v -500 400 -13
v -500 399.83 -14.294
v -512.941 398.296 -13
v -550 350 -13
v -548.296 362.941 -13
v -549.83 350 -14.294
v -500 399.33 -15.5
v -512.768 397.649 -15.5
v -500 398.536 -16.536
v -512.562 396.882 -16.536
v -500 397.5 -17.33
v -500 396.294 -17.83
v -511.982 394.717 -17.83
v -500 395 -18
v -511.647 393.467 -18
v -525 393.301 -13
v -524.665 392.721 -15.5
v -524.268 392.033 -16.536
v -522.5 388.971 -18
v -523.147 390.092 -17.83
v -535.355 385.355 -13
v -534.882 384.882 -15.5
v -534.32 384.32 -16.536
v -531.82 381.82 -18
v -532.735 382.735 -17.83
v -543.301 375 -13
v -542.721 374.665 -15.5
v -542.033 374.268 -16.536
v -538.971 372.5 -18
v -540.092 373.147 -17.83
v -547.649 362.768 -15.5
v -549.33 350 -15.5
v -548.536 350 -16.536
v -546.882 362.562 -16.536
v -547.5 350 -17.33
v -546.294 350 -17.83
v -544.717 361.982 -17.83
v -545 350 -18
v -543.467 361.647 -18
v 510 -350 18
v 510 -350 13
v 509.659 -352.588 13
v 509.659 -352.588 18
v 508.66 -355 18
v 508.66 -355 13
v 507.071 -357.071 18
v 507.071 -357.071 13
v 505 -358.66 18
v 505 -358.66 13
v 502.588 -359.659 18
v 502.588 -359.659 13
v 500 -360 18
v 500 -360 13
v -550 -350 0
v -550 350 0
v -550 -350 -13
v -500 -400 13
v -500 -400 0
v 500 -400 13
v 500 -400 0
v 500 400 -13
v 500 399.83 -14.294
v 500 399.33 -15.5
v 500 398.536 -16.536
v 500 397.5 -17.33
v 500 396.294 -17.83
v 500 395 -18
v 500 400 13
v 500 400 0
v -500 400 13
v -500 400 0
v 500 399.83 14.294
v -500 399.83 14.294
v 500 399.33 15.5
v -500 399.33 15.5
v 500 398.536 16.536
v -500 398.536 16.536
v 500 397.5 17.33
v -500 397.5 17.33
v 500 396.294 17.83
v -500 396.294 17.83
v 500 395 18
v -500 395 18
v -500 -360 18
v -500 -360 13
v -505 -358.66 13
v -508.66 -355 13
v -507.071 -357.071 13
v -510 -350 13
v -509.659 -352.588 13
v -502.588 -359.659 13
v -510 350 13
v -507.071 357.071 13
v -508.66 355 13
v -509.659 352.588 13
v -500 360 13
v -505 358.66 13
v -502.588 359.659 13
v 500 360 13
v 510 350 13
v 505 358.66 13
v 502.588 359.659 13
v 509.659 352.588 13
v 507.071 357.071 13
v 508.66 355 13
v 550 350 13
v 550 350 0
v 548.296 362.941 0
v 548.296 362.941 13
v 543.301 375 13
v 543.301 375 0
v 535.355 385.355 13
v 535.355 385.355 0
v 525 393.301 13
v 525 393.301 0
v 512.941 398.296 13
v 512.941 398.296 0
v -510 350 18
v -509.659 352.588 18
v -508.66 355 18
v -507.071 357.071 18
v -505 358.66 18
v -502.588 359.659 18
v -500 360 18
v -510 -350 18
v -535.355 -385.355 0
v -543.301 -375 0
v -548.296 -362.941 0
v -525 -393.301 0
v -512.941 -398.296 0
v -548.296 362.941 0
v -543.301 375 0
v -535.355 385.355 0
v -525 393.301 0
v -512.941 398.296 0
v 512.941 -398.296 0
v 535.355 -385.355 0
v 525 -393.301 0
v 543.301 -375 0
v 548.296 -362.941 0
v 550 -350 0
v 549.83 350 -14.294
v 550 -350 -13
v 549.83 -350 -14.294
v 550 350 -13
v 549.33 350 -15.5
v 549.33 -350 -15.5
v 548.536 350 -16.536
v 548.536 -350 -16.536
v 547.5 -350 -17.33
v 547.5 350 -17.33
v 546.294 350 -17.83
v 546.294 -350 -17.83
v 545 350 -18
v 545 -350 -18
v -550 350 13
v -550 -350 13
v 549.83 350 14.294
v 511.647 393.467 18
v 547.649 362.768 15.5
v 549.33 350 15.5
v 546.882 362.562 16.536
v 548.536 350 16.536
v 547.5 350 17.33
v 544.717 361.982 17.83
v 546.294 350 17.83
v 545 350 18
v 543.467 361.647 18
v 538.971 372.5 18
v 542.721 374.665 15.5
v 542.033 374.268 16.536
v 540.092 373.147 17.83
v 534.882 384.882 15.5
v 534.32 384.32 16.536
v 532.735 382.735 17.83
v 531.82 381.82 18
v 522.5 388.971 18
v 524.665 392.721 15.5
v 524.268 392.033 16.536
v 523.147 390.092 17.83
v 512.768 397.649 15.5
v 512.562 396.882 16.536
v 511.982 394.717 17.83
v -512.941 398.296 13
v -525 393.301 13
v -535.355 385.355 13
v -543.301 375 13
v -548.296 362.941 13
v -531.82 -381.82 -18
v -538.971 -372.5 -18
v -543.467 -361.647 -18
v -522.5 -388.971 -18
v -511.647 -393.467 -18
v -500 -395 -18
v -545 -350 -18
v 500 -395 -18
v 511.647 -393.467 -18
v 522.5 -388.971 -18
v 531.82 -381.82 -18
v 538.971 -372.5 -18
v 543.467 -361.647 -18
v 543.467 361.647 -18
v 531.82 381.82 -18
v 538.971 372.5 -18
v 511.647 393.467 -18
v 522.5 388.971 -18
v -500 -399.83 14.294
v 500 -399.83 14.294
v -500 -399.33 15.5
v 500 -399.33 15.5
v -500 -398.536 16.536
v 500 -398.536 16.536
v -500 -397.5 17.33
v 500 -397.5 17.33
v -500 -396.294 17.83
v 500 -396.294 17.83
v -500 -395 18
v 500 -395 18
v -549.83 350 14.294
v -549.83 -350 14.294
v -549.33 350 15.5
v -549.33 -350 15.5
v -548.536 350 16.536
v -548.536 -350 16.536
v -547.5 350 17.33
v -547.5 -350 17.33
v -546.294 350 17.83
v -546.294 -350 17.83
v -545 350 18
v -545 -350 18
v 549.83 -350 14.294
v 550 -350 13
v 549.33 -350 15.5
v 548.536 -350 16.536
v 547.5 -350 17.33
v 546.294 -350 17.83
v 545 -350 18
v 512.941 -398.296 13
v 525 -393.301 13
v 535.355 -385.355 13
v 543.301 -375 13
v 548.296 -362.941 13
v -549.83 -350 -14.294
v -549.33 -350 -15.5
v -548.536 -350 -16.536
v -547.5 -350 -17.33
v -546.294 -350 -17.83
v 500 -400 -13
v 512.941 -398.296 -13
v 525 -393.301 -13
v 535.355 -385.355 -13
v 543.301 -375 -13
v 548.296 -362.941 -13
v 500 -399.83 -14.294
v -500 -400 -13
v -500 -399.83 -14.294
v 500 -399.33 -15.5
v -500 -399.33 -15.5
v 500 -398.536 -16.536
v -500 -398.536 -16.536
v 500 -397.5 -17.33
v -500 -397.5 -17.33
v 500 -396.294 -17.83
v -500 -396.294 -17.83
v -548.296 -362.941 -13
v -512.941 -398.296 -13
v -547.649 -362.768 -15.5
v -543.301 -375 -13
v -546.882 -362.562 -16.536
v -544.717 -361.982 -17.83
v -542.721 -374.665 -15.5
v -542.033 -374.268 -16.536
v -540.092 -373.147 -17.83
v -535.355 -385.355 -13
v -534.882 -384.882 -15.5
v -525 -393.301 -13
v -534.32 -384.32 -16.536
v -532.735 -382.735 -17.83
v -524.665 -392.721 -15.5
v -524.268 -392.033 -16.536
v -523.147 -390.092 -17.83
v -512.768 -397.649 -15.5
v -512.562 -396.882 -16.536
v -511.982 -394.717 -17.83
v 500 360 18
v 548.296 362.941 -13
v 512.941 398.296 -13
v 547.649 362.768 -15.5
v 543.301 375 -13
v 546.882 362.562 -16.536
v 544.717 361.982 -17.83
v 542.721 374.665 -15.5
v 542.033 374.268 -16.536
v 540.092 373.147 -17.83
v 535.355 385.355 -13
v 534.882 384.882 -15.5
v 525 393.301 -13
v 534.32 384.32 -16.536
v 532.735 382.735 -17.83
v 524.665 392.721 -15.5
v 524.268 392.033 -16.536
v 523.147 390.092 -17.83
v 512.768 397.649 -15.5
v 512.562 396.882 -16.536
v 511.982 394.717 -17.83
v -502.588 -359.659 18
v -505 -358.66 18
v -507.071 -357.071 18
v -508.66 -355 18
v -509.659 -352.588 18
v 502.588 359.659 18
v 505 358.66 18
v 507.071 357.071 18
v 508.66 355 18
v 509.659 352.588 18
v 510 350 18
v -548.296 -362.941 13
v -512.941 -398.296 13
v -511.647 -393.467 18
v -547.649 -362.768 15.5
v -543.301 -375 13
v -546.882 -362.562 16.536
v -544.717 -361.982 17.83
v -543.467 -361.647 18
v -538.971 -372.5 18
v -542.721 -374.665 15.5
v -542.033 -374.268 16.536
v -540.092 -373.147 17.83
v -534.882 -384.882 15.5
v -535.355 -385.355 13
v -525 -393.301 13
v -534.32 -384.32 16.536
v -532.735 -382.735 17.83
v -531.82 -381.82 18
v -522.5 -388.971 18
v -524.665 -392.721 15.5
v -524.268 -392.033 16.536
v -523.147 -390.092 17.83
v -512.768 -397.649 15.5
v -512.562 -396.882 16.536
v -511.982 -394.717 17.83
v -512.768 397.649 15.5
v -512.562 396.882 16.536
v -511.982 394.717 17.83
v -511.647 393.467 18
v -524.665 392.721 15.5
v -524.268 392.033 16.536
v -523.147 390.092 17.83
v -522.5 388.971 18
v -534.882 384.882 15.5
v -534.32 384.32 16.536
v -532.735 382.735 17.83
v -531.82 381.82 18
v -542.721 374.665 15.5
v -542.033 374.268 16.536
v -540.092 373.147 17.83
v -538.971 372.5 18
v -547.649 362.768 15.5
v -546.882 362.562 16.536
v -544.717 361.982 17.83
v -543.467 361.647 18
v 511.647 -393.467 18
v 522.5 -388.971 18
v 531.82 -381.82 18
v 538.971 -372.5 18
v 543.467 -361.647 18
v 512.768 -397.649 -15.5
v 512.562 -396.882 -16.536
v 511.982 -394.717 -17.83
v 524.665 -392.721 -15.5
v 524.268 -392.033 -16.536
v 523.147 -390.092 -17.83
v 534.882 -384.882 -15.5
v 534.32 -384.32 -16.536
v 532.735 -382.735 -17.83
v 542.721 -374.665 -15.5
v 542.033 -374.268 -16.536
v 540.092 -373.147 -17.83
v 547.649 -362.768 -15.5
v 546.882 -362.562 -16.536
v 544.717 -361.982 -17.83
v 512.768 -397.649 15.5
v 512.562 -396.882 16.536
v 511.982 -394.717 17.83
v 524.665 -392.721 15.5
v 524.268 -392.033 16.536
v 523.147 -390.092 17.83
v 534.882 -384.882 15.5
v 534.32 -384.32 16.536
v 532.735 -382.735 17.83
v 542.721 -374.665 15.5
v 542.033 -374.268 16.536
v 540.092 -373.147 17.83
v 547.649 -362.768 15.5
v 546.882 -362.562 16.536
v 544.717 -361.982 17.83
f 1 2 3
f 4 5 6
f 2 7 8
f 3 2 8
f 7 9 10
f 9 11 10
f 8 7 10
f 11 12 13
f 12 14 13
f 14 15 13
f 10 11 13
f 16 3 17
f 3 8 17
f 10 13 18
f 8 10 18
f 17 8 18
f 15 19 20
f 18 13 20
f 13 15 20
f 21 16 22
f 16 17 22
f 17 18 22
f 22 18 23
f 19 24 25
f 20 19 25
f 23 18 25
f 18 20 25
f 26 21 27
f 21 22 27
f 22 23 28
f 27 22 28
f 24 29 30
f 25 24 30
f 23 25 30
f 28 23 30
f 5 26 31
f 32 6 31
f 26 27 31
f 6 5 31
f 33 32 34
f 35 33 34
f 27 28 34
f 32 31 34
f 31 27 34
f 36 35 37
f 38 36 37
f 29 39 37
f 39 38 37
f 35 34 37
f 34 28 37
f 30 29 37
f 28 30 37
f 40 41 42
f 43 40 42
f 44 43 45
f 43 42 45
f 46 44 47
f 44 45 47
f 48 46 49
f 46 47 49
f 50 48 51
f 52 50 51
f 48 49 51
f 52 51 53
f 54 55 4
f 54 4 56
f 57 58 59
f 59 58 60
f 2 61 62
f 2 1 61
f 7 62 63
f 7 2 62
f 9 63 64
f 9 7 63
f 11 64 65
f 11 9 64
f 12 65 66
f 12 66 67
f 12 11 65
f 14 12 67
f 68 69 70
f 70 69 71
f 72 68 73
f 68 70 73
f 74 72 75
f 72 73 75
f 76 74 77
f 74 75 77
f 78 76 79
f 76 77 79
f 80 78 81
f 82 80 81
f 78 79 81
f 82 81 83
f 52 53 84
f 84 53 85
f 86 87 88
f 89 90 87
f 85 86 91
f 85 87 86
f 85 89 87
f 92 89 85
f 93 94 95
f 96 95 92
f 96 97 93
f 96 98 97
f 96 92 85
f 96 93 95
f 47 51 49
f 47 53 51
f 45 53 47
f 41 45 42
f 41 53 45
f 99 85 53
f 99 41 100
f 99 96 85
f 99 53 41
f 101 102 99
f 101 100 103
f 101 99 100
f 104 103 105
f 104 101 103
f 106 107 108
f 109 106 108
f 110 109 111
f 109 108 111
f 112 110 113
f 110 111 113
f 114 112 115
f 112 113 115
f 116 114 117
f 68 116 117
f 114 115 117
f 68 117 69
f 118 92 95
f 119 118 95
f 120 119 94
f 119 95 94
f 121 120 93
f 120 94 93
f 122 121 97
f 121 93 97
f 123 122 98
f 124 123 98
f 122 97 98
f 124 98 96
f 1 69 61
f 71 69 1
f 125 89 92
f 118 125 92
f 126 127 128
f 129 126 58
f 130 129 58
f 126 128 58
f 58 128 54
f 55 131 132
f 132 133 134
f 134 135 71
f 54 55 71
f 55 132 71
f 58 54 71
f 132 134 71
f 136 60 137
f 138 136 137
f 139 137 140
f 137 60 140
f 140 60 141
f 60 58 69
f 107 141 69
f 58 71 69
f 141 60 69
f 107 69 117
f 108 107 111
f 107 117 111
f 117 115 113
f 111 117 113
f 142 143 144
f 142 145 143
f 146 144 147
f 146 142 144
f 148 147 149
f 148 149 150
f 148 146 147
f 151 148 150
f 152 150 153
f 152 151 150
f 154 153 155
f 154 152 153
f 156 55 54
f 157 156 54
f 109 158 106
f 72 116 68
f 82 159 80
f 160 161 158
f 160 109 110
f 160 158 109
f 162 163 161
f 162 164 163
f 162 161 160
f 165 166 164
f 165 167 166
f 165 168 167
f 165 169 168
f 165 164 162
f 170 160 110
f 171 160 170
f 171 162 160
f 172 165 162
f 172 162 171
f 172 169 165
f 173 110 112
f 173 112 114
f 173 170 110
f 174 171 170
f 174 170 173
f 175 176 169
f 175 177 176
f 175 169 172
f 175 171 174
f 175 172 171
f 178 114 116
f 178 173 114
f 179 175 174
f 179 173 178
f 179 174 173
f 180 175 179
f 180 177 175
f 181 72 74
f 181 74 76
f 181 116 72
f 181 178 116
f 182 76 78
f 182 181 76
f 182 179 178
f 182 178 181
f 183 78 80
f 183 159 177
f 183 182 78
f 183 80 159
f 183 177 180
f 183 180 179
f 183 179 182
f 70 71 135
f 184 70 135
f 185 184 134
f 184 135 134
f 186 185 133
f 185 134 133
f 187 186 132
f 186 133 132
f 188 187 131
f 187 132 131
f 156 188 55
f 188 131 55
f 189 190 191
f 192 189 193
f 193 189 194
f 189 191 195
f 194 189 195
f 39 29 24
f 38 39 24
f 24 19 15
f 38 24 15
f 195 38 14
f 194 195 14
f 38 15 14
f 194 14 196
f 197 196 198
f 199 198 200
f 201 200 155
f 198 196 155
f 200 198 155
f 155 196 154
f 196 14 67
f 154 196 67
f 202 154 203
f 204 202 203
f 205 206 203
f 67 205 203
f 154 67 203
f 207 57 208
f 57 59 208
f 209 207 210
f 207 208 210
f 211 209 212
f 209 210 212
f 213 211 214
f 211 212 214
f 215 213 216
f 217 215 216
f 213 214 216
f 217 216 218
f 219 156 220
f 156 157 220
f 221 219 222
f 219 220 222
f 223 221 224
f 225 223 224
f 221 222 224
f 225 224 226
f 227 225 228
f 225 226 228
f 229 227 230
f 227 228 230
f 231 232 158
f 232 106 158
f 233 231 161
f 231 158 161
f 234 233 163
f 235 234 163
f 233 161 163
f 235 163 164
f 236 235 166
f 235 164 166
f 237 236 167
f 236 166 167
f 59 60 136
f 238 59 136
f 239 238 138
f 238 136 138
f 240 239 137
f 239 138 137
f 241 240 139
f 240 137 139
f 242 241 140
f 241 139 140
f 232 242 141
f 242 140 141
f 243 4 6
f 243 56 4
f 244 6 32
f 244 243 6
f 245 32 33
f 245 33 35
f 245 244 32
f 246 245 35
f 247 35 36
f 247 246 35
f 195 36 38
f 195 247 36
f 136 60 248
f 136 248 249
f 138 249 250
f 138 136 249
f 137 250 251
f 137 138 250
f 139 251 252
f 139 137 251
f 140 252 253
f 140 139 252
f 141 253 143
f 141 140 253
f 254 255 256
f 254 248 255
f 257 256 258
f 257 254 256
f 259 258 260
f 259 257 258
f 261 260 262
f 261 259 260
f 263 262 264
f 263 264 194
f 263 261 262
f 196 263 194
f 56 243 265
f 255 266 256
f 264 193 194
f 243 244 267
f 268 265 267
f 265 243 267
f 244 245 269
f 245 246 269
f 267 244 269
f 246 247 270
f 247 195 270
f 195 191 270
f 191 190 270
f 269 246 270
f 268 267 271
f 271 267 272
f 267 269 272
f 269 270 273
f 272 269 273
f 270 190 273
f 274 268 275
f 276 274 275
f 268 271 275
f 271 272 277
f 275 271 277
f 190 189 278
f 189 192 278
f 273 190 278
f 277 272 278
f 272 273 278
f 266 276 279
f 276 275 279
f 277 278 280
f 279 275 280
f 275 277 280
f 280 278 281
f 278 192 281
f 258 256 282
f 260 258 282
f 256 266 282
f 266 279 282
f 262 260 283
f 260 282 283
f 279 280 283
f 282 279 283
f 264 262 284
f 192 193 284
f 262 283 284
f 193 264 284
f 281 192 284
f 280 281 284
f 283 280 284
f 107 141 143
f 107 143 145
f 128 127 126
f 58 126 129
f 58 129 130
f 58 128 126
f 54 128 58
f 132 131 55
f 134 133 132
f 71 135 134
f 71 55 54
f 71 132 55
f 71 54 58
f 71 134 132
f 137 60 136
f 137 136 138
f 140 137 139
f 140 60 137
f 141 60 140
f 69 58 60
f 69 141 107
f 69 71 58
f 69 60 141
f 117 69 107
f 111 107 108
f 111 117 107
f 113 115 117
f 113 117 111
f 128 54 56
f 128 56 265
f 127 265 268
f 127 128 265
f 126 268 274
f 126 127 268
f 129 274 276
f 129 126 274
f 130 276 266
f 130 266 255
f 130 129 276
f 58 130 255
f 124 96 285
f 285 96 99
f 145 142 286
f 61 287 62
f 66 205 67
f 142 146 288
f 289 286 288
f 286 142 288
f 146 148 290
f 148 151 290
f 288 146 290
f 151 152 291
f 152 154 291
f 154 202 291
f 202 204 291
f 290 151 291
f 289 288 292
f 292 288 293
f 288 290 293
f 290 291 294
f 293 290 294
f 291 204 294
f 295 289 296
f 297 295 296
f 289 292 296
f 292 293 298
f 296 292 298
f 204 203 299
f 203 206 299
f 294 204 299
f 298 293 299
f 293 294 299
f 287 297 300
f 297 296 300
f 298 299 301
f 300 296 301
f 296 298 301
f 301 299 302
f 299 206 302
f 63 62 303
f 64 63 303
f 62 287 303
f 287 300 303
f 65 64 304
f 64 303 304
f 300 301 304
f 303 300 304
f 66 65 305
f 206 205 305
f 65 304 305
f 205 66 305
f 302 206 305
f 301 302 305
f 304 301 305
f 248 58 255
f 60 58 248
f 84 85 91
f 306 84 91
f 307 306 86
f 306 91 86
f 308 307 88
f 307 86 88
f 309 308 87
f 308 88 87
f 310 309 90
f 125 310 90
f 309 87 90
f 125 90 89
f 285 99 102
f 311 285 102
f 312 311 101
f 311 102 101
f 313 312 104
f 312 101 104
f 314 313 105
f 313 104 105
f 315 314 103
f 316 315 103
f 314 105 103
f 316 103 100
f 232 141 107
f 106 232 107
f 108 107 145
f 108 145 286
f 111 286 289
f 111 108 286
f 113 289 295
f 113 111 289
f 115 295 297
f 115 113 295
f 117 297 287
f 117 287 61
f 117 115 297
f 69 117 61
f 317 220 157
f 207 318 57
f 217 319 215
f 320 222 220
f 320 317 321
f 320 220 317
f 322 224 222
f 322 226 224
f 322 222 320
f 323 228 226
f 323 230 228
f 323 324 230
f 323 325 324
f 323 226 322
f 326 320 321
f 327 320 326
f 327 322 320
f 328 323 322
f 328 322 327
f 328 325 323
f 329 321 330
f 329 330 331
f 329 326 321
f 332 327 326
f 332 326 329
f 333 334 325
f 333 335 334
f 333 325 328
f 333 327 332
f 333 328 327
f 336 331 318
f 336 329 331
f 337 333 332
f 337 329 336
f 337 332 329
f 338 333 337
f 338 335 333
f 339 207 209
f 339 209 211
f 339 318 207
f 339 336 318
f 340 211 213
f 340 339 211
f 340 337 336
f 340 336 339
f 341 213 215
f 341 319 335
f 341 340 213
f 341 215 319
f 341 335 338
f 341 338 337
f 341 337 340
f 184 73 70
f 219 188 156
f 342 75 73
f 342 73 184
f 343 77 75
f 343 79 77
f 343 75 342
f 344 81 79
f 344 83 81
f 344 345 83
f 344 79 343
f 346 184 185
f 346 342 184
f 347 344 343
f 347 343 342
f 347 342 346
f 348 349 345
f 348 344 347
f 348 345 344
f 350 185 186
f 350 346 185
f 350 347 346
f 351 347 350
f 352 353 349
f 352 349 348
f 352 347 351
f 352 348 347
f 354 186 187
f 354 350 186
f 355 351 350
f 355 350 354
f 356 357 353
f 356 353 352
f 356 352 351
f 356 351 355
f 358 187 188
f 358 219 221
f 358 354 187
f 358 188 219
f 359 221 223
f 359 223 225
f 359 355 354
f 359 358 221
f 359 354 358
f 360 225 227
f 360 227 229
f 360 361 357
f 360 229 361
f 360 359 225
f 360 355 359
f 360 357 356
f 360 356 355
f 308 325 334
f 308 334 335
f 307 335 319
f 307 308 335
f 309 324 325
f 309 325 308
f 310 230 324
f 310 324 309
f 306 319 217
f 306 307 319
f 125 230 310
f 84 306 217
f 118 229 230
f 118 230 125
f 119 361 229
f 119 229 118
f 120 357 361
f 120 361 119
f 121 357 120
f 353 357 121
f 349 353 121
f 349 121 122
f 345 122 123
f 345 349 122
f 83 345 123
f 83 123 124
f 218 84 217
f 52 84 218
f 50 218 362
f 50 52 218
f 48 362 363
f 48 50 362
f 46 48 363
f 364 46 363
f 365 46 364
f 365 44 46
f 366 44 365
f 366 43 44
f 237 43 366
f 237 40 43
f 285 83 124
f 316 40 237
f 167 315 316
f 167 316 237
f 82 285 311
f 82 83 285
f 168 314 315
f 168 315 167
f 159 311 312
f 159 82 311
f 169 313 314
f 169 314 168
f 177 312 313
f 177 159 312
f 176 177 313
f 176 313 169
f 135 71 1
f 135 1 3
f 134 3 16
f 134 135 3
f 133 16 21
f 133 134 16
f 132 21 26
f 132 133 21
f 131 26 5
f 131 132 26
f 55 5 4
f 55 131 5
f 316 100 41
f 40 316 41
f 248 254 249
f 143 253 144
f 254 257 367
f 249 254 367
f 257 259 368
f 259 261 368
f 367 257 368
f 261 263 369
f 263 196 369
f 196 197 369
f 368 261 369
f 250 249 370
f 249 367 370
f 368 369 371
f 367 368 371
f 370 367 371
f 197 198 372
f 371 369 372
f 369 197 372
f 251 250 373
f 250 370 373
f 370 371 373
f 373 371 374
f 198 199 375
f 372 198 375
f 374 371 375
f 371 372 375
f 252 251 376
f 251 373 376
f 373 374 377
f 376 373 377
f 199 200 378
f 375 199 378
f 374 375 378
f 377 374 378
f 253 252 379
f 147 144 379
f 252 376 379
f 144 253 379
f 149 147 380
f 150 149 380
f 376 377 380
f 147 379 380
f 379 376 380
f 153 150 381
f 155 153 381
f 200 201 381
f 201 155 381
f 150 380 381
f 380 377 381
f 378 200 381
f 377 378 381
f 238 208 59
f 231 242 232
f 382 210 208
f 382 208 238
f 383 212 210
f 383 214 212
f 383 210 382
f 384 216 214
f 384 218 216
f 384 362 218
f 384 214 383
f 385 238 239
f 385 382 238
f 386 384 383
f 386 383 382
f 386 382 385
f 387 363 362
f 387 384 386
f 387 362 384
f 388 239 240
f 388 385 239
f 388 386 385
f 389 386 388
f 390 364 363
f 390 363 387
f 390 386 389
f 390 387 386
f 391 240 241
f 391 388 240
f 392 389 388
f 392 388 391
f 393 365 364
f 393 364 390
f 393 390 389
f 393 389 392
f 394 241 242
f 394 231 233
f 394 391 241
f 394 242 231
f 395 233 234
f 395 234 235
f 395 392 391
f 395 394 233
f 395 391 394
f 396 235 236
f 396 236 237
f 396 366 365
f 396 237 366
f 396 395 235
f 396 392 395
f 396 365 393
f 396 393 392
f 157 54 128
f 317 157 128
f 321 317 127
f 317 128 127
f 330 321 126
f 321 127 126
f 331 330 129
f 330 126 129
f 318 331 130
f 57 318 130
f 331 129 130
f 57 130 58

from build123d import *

# Parameters (mm, degrees)
F1_DEPTH = 13
F2_DEPTH = 18
F3_DEPTH = 18
F4_R     = 5
F5_R     = 5


with BuildPart() as f1:
    # F0 (on Top) → F1 (new body)
    with BuildSketch(Plane.XY):
        with BuildLine():
            Line((500, 400), (-500, 400))
            ThreePointArc((-500, 400), (-535.355339, 385.355339), (-550, 350))
            Line((-550, 350), (-550, -350))
            ThreePointArc((-550, -350), (-535.355339, -385.355339), (-500, -400))
            Line((-500, -400), (500, -400))
            ThreePointArc((500, -400), (535.355339, -385.355339), (550, -350))
            Line((550, -350), (550, 350))
            ThreePointArc((550, 350), (535.355339, 385.355339), (500, 400))
        make_face()
        with BuildLine():
            ThreePointArc((-510, 350), (-507.071068, 357.071068), (-500, 360))
            Line((-500, 360), (500, 360))
            ThreePointArc((500, 360), (507.071068, 357.071068), (510, 350))
            Line((510, 350), (510, -350))
            ThreePointArc((510, -350), (507.071068, -357.071068), (500, -360))
            Line((500, -360), (-500, -360))
            ThreePointArc((-500, -360), (-507.071068, -357.071068), (-510, -350))
            Line((-510, -350), (-510, 350))
        make_face(mode=Mode.SUBTRACT)
        with BuildLine():
            Line((500, 360), (-500, 360))
            ThreePointArc((-500, 360), (-507.071068, 357.071068), (-510, 350))
            Line((-510, 350), (-510, -350))
            ThreePointArc((-510, -350), (-507.071068, -357.071068), (-500, -360))
            Line((-500, -360), (500, -360))
            ThreePointArc((500, -360), (507.071068, -357.071068), (510, -350))
            Line((510, -350), (510, 350))
            ThreePointArc((510, 350), (507.071068, 357.071068), (500, 360))
        make_face()
    extrude(amount=F1_DEPTH)

    # F0 (on Top) → F2 (join)
    with BuildSketch(Plane.XY):
        with BuildLine():
            Line((500, 400), (-500, 400))
            ThreePointArc((-500, 400), (-535.355339, 385.355339), (-550, 350))
            Line((-550, 350), (-550, -350))
            ThreePointArc((-550, -350), (-535.355339, -385.355339), (-500, -400))
            Line((-500, -400), (500, -400))
            ThreePointArc((500, -400), (535.355339, -385.355339), (550, -350))
            Line((550, -350), (550, 350))
            ThreePointArc((550, 350), (535.355339, 385.355339), (500, 400))
        make_face()
        with BuildLine():
            ThreePointArc((-510, 350), (-507.071068, 357.071068), (-500, 360))
            Line((-500, 360), (500, 360))
            ThreePointArc((500, 360), (507.071068, 357.071068), (510, 350))
            Line((510, 350), (510, -350))
            ThreePointArc((510, -350), (507.071068, -357.071068), (500, -360))
            Line((500, -360), (-500, -360))
            ThreePointArc((-500, -360), (-507.071068, -357.071068), (-510, -350))
            Line((-510, -350), (-510, 350))
        make_face(mode=Mode.SUBTRACT)
    extrude(amount=F2_DEPTH)

    # F4
    f4_edges = [f1.edges().sort_by_distance(p)[0] for p in [
        (550, 0, 18),
    ]]
    fillet(f4_edges, radius=F4_R)


with BuildPart() as f3:
    # F0 (on Top) → F3 (new body)
    with BuildSketch(Plane.XY):
        with BuildLine():
            Line((500, 400), (-500, 400))
            ThreePointArc((-500, 400), (-535.355339, 385.355339), (-550, 350))
            Line((-550, 350), (-550, -350))
            ThreePointArc((-550, -350), (-535.355339, -385.355339), (-500, -400))
            Line((-500, -400), (500, -400))
            ThreePointArc((500, -400), (535.355339, -385.355339), (550, -350))
            Line((550, -350), (550, 350))
            ThreePointArc((550, 350), (535.355339, 385.355339), (500, 400))
        make_face()
        with BuildLine():
            ThreePointArc((-510, 350), (-507.071068, 357.071068), (-500, 360))
            Line((-500, 360), (500, 360))
            ThreePointArc((500, 360), (507.071068, 357.071068), (510, 350))
            Line((510, 350), (510, -350))
            ThreePointArc((510, -350), (507.071068, -357.071068), (500, -360))
            Line((500, -360), (-500, -360))
            ThreePointArc((-500, -360), (-507.071068, -357.071068), (-510, -350))
            Line((-510, -350), (-510, 350))
        make_face(mode=Mode.SUBTRACT)
        with BuildLine():
            Line((500, 360), (-500, 360))
            ThreePointArc((-500, 360), (-507.071068, 357.071068), (-510, 350))
            Line((-510, 350), (-510, -350))
            ThreePointArc((-510, -350), (-507.071068, -357.071068), (-500, -360))
            Line((-500, -360), (500, -360))
            ThreePointArc((500, -360), (507.071068, -357.071068), (510, -350))
            Line((510, -350), (510, 350))
            ThreePointArc((510, 350), (507.071068, 357.071068), (500, 360))
        make_face()
    extrude(amount=-F3_DEPTH)

    # F5
    f5_edges = [f3.edges().sort_by_distance(p)[0] for p in [
        (550, 0, -18),
    ]]
    fillet(f5_edges, radius=F5_R)


solid = Compound([f1.part, f3.part])
